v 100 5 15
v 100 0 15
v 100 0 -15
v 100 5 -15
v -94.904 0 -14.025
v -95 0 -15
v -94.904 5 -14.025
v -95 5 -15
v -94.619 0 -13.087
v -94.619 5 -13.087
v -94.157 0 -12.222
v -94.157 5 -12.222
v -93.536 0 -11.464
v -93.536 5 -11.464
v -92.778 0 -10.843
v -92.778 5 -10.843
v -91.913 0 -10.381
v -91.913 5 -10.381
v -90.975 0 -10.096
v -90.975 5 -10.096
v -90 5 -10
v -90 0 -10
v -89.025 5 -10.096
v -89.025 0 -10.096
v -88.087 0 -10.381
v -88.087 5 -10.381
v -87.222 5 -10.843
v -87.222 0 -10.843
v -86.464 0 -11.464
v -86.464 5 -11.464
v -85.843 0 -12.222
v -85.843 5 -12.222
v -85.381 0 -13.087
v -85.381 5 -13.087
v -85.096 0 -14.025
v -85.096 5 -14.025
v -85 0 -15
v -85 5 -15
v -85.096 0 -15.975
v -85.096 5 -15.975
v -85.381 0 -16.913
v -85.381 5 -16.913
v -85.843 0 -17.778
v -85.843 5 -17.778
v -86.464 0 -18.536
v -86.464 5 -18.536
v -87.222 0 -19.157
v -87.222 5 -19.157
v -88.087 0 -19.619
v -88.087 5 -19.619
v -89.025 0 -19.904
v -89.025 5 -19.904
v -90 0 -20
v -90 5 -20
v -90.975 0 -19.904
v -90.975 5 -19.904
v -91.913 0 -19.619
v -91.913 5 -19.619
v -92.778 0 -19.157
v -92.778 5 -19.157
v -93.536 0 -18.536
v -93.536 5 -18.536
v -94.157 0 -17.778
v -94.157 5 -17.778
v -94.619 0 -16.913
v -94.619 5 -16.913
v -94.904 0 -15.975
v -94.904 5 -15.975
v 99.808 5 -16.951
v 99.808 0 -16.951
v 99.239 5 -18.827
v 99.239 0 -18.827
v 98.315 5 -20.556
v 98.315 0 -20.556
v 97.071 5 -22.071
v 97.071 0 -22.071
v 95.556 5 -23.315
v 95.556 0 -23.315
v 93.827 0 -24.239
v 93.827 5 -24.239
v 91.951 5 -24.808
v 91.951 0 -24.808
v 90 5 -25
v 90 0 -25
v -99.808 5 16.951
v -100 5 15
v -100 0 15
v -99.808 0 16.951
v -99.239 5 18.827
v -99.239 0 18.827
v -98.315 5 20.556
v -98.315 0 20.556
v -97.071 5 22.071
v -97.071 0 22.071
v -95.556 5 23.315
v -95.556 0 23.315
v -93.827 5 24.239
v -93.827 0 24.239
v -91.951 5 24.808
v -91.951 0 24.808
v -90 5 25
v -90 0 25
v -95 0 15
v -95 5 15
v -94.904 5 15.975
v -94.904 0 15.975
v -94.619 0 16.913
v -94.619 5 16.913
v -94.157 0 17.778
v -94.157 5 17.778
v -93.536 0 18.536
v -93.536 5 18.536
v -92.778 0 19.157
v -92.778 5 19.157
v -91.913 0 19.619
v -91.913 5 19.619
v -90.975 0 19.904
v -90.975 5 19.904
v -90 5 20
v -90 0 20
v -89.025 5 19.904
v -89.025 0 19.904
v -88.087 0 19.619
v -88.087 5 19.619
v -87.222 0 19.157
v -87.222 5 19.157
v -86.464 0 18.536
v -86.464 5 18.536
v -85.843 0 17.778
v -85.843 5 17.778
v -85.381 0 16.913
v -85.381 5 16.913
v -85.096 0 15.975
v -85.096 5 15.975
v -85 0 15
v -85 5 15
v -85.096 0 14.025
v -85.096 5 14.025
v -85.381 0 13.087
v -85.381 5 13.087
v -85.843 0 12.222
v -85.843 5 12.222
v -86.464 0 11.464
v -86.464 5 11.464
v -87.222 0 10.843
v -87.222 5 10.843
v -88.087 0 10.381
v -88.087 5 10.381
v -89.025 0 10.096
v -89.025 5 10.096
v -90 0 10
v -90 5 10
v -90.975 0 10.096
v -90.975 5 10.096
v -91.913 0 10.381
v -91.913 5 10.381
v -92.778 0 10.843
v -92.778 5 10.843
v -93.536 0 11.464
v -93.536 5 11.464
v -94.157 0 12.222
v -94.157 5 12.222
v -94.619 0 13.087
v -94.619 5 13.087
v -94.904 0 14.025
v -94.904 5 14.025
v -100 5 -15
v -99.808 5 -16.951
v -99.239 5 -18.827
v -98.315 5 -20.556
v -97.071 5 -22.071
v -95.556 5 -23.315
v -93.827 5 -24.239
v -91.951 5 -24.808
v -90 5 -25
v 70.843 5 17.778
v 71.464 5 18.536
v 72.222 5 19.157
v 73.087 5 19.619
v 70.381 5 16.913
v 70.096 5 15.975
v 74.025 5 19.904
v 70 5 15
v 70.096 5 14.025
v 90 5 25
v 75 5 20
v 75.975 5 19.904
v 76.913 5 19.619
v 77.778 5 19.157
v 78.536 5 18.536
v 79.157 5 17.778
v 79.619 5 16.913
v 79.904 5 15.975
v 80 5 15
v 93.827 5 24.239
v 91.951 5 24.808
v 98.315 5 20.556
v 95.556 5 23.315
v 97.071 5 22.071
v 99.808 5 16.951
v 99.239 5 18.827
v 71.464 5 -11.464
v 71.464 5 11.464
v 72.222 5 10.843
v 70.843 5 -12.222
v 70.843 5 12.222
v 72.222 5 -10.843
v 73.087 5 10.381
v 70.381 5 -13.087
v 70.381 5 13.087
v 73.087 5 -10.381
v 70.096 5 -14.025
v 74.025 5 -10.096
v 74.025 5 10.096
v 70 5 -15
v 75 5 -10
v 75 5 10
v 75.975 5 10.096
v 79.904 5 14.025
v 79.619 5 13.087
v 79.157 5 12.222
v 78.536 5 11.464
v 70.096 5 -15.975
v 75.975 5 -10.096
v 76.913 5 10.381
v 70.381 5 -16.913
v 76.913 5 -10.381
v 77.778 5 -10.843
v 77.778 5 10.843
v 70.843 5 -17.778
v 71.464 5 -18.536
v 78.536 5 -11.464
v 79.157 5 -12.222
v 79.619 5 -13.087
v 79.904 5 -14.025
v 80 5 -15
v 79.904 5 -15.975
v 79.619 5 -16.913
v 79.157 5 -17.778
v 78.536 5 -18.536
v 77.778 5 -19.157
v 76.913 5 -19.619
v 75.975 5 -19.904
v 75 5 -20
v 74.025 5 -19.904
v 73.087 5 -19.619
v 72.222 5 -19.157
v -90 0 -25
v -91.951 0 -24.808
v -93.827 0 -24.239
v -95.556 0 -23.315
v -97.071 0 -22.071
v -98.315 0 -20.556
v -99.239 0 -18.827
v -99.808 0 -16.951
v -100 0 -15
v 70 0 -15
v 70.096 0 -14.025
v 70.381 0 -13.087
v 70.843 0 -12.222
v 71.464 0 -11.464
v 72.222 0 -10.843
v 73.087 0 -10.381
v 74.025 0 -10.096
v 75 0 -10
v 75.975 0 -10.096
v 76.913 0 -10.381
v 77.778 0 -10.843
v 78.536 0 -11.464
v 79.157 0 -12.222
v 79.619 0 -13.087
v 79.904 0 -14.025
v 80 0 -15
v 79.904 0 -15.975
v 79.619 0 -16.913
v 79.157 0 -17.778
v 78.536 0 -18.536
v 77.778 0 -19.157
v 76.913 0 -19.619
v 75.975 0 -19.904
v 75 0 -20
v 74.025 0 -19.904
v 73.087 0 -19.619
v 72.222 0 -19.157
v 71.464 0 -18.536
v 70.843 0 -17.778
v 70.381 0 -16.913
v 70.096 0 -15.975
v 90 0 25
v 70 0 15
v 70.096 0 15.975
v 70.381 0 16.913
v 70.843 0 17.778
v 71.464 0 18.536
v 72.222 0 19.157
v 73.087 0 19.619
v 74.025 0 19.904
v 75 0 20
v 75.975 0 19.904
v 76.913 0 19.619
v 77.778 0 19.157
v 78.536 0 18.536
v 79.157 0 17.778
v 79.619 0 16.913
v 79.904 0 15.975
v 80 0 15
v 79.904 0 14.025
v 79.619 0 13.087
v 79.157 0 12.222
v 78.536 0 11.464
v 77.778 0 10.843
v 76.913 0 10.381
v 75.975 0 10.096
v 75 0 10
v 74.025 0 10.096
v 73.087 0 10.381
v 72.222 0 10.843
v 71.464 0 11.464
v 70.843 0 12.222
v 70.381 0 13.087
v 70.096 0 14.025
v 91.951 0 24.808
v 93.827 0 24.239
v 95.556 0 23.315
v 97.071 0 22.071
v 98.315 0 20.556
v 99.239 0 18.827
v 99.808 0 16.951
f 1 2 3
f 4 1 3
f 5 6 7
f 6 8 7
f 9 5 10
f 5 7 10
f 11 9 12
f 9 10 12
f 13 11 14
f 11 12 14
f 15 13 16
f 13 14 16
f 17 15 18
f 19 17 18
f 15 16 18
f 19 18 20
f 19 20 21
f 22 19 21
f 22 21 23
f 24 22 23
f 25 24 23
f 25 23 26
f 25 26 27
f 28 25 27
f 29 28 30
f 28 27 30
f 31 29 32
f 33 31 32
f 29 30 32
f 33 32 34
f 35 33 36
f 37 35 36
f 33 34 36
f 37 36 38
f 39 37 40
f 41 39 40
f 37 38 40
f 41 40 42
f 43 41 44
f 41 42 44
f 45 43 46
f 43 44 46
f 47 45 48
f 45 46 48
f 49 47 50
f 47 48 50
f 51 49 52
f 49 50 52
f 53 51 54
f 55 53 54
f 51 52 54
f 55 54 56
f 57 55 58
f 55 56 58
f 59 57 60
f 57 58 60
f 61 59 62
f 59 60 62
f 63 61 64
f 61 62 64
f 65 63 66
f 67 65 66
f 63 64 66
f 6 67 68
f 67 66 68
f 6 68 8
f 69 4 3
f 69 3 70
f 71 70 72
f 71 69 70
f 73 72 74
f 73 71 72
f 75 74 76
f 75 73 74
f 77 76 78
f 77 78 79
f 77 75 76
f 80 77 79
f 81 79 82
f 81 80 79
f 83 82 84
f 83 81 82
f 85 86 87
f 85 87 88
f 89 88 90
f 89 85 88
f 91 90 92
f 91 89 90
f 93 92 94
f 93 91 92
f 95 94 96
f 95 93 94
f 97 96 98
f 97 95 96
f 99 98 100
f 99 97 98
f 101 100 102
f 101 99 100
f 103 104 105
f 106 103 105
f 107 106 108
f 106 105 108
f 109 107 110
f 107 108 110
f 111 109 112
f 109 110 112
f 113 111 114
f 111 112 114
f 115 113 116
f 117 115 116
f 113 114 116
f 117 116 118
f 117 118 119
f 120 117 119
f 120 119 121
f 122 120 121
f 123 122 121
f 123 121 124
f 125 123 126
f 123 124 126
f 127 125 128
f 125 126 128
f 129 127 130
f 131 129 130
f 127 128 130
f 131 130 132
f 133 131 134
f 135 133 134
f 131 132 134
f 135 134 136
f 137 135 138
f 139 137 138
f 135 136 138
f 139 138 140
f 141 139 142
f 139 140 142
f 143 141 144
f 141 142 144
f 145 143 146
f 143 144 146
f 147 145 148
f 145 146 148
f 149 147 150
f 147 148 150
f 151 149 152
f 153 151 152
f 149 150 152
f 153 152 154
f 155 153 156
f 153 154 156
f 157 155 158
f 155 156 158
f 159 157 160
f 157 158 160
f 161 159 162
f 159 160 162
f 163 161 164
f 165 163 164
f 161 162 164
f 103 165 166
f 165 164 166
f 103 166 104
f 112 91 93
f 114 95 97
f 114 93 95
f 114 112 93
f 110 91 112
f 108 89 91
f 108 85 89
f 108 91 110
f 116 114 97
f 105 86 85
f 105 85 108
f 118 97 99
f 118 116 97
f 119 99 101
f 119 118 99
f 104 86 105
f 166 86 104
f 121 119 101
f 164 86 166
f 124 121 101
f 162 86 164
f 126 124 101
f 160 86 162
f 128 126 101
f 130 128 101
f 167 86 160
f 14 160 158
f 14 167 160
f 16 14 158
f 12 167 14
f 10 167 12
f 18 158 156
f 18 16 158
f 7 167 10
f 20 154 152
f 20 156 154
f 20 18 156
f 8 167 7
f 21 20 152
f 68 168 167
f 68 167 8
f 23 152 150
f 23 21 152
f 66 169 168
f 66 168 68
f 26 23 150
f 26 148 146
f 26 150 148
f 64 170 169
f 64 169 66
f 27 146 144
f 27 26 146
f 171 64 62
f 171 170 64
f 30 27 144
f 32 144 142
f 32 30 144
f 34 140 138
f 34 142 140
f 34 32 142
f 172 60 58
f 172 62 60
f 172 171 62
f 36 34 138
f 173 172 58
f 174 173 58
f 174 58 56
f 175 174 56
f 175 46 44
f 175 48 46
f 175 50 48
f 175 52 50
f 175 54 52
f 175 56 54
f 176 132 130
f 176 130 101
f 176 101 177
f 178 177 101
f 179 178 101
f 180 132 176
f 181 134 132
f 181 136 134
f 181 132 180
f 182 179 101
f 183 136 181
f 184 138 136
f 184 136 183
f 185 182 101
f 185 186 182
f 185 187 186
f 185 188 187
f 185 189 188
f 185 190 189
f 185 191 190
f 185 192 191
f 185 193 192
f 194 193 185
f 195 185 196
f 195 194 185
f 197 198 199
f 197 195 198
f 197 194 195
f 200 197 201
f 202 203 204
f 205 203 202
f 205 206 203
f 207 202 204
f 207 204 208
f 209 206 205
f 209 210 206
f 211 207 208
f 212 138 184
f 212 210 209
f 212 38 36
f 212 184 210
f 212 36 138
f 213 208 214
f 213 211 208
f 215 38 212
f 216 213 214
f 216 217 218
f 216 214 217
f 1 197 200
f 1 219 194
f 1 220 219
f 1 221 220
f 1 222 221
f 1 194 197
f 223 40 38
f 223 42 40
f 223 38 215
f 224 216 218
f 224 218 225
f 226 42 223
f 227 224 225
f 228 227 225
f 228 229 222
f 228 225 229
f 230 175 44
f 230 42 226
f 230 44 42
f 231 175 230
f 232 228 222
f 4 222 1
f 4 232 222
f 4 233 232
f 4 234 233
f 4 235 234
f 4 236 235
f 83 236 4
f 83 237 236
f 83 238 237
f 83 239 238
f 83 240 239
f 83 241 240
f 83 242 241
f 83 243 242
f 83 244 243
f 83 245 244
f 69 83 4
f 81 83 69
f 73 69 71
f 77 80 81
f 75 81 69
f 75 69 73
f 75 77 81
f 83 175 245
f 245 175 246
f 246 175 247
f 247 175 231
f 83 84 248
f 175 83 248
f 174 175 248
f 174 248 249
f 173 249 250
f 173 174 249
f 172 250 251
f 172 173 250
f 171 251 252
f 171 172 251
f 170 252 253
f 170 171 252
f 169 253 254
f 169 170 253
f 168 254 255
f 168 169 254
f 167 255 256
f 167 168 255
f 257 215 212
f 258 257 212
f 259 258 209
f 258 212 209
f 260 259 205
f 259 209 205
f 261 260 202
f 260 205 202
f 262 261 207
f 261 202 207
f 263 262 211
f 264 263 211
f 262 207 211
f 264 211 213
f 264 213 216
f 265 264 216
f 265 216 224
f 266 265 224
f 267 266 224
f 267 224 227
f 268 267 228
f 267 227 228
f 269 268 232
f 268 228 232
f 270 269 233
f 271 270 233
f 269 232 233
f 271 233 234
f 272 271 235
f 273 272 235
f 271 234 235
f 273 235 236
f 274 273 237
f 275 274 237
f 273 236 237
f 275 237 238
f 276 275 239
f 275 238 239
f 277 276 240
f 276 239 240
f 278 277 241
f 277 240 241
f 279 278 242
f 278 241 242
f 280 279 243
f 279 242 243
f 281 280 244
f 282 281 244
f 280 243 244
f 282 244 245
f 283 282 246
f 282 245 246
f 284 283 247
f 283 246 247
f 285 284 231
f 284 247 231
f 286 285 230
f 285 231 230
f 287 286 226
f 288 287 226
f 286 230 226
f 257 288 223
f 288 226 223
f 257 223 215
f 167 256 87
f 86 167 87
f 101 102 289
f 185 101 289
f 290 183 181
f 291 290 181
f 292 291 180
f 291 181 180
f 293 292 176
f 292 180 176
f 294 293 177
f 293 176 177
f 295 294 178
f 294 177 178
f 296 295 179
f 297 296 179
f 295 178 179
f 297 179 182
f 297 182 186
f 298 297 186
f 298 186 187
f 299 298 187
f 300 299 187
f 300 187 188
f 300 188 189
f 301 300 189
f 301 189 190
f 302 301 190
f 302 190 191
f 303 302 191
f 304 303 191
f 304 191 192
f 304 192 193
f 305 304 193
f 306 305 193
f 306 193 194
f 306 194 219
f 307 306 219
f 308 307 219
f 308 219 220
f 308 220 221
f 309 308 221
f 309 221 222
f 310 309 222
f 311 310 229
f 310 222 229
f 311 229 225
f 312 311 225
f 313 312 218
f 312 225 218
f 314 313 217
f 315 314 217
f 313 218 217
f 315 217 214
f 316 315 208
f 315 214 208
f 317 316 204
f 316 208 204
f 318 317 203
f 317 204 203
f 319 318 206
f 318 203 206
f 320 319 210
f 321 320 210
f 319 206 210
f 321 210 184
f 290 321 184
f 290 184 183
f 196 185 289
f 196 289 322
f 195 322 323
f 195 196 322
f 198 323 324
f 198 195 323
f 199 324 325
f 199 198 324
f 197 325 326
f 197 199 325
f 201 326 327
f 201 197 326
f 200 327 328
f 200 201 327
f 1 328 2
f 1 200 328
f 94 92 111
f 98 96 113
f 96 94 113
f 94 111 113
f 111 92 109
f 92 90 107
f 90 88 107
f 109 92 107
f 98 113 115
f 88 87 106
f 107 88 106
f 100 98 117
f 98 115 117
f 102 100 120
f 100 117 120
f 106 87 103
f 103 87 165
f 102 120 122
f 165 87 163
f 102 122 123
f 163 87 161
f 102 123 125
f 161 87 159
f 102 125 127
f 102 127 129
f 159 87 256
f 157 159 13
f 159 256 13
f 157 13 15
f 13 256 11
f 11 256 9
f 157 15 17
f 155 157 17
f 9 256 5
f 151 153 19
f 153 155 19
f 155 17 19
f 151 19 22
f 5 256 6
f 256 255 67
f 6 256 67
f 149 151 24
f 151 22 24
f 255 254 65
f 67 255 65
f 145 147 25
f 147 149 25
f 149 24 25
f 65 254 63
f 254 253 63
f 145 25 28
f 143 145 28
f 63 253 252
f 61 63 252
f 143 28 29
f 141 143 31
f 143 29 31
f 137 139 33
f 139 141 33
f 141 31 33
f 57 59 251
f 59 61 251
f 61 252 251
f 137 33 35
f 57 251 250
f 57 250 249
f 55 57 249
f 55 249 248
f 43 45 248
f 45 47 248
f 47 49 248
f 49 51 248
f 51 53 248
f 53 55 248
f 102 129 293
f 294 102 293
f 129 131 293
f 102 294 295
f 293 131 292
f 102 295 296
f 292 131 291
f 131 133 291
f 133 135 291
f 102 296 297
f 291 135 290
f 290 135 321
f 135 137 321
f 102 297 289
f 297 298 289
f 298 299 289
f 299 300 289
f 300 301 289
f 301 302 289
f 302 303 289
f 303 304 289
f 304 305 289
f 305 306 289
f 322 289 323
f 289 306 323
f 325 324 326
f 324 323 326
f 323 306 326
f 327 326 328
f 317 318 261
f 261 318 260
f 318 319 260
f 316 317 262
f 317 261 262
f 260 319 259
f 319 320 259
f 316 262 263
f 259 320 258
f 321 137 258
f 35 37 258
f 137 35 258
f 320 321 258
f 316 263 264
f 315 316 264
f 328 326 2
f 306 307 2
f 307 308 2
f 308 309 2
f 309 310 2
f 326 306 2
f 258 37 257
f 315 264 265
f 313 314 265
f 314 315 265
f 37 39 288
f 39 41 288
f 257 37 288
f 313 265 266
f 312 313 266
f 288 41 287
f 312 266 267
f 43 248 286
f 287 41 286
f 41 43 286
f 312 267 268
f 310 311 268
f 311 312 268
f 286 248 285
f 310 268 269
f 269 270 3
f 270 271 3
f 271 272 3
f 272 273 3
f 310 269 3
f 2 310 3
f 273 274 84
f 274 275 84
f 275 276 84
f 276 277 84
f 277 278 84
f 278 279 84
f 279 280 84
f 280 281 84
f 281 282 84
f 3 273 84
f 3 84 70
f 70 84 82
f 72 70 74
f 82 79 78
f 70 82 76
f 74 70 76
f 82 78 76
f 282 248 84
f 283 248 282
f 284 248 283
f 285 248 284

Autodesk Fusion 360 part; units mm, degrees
sketch "Sketch1" plane through (0, 0, 0) normal (0, 1, 0) x (1, 0, 0)
  line L0 (100, 25) -> (-100, 25)
  line L1 (-100, 25) -> (-100, -25)
  line L2 (-100, -25) -> (100, -25)
  line L3 (100, -25) -> (100, 25)
  line L4 (100, 25) -> (-100, -25) construction
  line L5 (-100, 25) -> (100, -25) construction
  dimension "d1" = 200
  dimension "d2" = 50
extrude "Extrude1" add sketch "Sketch1" along normal blind 5
fillet "Fillet1" radius 10 4 edges at (-100, 2.5, 25) (-100, 2.5, -25) (100, 2.5, -25) (100, 2.5, 25)
sketch "Sketch2" plane through (0, 5, 0) normal (0, 1, 0) x (-1, 0, 0)
  arc A0 (-90, 25) -> (-100, 15) centre (-90, 15) ccw
  line L0 (-100, 15) -> (-100, -15)
  arc A1 (-100, -15) -> (-90, -25) centre (-90, -15) ccw
  line L1 (-90, -25) -> (90, -25)
  arc A2 (90, -25) -> (100, -15) centre (90, -15) ccw
  line L2 (100, -15) -> (100, 15)
  arc A3 (100, 15) -> (90, 25) centre (90, 15) ccw
  line L3 (90, 25) -> (-90, 25)
  circle A4 centre (90, -15) radius 5
  circle A5 centre (90, 15) radius 5
  circle A6 centre (-75, -15) radius 5
  circle A7 centre (-75, 15) radius 5
  dimension "d6" = 10
  dimension "d7" = 15
extrude "Extrude2" cut sketch "Sketch2" against normal through all contours A4 | A5 | A6 | A7
